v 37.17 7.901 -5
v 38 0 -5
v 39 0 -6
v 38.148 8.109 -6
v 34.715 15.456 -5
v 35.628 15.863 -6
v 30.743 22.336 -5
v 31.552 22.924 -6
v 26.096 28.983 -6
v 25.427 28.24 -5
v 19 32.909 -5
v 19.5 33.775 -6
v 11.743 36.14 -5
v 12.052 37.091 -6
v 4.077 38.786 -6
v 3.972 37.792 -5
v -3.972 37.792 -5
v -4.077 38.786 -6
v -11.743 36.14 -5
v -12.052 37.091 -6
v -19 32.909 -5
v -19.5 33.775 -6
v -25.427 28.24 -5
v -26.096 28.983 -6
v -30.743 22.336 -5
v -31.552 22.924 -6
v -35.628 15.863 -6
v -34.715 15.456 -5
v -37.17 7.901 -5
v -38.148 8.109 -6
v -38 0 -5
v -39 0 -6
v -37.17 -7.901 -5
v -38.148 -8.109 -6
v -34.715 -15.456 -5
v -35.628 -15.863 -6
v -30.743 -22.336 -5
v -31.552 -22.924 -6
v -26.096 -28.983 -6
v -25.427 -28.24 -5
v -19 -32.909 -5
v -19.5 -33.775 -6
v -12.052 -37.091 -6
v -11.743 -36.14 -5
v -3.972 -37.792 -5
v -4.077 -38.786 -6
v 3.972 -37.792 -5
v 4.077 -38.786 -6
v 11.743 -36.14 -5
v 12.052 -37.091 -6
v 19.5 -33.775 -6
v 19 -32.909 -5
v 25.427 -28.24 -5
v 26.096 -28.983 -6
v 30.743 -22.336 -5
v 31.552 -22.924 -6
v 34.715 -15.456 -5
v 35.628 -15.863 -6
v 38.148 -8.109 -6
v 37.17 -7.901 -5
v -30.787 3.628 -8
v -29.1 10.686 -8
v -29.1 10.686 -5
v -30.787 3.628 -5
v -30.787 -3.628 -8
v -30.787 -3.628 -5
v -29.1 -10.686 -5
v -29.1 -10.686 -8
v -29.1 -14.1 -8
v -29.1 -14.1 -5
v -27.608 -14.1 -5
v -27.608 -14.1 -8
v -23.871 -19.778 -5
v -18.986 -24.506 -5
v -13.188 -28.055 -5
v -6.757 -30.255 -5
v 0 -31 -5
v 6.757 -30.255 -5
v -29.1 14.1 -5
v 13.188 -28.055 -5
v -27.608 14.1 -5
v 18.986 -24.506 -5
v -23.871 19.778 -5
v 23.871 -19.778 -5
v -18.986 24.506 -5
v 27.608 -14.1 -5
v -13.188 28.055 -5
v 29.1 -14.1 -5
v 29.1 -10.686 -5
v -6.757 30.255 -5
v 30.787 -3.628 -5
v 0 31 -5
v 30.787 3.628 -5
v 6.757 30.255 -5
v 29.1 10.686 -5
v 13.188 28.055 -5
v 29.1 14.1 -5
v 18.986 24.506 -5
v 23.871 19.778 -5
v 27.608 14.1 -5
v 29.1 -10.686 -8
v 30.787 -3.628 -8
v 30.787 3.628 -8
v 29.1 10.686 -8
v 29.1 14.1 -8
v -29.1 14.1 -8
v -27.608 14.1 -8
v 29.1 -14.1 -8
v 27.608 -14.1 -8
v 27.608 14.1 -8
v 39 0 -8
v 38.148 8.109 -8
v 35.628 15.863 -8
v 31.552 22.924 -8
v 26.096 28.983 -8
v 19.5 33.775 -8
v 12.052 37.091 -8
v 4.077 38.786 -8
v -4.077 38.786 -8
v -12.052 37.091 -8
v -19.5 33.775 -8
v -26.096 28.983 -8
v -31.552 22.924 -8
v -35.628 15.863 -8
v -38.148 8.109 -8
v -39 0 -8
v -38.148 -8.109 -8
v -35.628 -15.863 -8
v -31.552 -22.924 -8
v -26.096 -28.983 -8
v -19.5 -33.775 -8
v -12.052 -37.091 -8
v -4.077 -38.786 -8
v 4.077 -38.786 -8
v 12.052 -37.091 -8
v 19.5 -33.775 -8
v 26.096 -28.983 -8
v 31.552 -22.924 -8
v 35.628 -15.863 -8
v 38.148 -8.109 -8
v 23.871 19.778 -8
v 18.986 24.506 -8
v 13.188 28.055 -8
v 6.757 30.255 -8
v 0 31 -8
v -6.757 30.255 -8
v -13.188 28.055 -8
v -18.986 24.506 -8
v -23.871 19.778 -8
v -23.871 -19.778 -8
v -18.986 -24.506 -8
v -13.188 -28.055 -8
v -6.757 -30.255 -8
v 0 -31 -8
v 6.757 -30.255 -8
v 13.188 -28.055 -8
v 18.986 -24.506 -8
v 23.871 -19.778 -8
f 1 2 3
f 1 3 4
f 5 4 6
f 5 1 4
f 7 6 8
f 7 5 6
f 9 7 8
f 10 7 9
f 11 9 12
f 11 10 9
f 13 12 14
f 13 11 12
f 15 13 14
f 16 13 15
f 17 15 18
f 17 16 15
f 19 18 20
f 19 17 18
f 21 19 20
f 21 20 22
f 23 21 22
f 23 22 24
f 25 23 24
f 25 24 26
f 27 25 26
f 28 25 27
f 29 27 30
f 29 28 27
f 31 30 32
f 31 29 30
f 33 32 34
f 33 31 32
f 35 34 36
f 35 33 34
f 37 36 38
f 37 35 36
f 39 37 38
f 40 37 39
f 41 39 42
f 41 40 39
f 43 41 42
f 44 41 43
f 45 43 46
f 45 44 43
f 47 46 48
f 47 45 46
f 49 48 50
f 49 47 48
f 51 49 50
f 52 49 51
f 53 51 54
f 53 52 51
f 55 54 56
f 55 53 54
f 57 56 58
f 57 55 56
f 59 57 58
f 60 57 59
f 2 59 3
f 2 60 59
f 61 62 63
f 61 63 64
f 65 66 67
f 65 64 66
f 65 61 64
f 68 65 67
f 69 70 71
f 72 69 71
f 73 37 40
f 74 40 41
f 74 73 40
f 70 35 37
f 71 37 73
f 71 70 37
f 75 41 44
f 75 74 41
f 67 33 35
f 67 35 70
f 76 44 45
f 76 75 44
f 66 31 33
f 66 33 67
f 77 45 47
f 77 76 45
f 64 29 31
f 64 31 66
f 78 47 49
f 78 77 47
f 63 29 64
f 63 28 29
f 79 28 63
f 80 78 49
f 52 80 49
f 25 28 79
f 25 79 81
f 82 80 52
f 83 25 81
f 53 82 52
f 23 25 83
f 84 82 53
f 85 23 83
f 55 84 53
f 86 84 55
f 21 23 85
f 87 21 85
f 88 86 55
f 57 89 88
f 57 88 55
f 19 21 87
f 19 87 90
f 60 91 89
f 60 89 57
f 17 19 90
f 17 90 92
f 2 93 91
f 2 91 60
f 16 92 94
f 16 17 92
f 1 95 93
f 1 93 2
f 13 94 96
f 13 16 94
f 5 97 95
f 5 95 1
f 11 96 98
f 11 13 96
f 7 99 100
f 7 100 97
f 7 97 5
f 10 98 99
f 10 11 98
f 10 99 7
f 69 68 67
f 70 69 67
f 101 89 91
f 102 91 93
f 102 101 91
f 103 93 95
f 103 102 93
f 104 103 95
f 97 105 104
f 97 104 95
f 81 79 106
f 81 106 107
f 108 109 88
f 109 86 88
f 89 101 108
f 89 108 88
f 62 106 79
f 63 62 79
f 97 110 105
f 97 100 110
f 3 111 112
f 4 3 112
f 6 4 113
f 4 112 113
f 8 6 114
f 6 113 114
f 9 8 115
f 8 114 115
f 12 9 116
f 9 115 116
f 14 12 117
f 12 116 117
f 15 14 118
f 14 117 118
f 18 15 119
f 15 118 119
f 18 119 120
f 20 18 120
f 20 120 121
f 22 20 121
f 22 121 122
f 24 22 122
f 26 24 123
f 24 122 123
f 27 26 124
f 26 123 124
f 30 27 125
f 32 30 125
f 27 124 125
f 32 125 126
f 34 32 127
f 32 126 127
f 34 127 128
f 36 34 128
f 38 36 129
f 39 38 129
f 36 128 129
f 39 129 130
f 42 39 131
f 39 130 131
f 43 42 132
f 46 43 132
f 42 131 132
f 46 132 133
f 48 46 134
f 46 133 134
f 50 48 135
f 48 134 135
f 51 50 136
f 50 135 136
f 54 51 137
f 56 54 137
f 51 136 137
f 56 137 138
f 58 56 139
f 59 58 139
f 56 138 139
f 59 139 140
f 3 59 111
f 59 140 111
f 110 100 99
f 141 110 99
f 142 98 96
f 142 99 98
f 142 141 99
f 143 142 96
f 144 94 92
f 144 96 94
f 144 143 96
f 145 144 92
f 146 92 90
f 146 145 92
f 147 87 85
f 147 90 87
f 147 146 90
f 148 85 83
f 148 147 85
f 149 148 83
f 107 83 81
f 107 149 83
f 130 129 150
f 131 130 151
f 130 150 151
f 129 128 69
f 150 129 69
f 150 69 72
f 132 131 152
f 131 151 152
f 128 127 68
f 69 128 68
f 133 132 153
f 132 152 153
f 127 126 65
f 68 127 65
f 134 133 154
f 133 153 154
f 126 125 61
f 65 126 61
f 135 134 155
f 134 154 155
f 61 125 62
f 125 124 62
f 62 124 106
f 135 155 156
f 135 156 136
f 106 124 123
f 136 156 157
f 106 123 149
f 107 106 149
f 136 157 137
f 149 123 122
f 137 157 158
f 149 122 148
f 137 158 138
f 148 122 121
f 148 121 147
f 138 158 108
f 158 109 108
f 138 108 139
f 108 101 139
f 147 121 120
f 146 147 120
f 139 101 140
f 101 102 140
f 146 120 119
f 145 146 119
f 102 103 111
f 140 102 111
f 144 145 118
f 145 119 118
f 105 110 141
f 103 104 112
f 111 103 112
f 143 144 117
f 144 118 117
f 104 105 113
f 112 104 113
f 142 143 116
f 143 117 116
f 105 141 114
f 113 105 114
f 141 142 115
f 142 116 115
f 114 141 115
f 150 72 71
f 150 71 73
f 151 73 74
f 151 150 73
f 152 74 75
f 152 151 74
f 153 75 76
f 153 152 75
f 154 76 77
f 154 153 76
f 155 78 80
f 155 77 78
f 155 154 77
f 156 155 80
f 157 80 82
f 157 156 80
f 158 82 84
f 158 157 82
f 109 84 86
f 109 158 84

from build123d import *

# Parameters (mm, degrees)
BOX878_W                     = 2.2
BOX878_H                     = 20
BOX878_DEPTH                 = 28.2
BOX877_W                     = 2.2
BOX877_H                     = 20
BOX877_DEPTH                 = 28.2
COMPOUND1139_PLACEMENT_ANGLE = 90
CYLINDER2555_R               = 31
CYLINDER2555_DEPTH           = 34
CYLINDER2556_R               = 39
CYLINDER2556_DEPTH           = 3
CHAMFER090_SIZE              = 1


with BuildPart() as krychle877:
    # Box878 → Box878 (new body)
    with BuildSketch(Plane(origin=(43.9, -111, -4.1), x_dir=(1, 0, 0), z_dir=(0, 0, 1))):
        with Locations((1.1, 10)):
            Rectangle(BOX878_W, BOX878_H)
    extrude(amount=BOX878_DEPTH)


with BuildPart() as compound1139:
    # Box877 → Box877 (new body)
    with BuildSketch(Plane(origin=(-12.1, -111, -4.1), x_dir=(1, 0, 0), z_dir=(0, 0, 1))):
        with Locations((1.1, 10)):
            Rectangle(BOX877_W, BOX877_H)
    extrude(amount=BOX877_DEPTH)

    # Compound1139: union Krychle877
    add(krychle877.part)


with BuildPart() as compound1139_1:
    # Compound1139 placement: moved
    add(compound1139.part.moved(Location((-17, 10, 97))).rotate(Axis((-17, 10, 97), (1, 0, 0)), COMPOUND1139_PLACEMENT_ANGLE))


with BuildPart() as v_lec2525:
    # Cylinder2555 → Cylinder2555 (new body)
    with BuildSketch(Plane.XY.offset(-21)):
        Circle(CYLINDER2555_R)
    extrude(amount=CYLINDER2555_DEPTH)


with BuildPart() as cut965:
    # Cylinder2556 → Cylinder2556 (new body)
    with BuildSketch(Plane.XY):
        Circle(CYLINDER2556_R)
    extrude(amount=CYLINDER2556_DEPTH)

    # Cut948: cut Válec2525
    add(v_lec2525.part, mode=Mode.SUBTRACT)

    # Chamfer090
    chamfer090_edges = [cut965.edges().sort_by_distance(p)[0] for p in [
        (-39, 0, 3),
    ]]
    chamfer(chamfer090_edges, length=CHAMFER090_SIZE)


with BuildPart() as cut965_1:
    # Chamfer090 placement: moved
    add(cut965.part.moved(Location((0, 0, -8))))

    # Cut965: cut Compound1139
    add(compound1139_1.part, mode=Mode.SUBTRACT)


solid = cut965_1.part
